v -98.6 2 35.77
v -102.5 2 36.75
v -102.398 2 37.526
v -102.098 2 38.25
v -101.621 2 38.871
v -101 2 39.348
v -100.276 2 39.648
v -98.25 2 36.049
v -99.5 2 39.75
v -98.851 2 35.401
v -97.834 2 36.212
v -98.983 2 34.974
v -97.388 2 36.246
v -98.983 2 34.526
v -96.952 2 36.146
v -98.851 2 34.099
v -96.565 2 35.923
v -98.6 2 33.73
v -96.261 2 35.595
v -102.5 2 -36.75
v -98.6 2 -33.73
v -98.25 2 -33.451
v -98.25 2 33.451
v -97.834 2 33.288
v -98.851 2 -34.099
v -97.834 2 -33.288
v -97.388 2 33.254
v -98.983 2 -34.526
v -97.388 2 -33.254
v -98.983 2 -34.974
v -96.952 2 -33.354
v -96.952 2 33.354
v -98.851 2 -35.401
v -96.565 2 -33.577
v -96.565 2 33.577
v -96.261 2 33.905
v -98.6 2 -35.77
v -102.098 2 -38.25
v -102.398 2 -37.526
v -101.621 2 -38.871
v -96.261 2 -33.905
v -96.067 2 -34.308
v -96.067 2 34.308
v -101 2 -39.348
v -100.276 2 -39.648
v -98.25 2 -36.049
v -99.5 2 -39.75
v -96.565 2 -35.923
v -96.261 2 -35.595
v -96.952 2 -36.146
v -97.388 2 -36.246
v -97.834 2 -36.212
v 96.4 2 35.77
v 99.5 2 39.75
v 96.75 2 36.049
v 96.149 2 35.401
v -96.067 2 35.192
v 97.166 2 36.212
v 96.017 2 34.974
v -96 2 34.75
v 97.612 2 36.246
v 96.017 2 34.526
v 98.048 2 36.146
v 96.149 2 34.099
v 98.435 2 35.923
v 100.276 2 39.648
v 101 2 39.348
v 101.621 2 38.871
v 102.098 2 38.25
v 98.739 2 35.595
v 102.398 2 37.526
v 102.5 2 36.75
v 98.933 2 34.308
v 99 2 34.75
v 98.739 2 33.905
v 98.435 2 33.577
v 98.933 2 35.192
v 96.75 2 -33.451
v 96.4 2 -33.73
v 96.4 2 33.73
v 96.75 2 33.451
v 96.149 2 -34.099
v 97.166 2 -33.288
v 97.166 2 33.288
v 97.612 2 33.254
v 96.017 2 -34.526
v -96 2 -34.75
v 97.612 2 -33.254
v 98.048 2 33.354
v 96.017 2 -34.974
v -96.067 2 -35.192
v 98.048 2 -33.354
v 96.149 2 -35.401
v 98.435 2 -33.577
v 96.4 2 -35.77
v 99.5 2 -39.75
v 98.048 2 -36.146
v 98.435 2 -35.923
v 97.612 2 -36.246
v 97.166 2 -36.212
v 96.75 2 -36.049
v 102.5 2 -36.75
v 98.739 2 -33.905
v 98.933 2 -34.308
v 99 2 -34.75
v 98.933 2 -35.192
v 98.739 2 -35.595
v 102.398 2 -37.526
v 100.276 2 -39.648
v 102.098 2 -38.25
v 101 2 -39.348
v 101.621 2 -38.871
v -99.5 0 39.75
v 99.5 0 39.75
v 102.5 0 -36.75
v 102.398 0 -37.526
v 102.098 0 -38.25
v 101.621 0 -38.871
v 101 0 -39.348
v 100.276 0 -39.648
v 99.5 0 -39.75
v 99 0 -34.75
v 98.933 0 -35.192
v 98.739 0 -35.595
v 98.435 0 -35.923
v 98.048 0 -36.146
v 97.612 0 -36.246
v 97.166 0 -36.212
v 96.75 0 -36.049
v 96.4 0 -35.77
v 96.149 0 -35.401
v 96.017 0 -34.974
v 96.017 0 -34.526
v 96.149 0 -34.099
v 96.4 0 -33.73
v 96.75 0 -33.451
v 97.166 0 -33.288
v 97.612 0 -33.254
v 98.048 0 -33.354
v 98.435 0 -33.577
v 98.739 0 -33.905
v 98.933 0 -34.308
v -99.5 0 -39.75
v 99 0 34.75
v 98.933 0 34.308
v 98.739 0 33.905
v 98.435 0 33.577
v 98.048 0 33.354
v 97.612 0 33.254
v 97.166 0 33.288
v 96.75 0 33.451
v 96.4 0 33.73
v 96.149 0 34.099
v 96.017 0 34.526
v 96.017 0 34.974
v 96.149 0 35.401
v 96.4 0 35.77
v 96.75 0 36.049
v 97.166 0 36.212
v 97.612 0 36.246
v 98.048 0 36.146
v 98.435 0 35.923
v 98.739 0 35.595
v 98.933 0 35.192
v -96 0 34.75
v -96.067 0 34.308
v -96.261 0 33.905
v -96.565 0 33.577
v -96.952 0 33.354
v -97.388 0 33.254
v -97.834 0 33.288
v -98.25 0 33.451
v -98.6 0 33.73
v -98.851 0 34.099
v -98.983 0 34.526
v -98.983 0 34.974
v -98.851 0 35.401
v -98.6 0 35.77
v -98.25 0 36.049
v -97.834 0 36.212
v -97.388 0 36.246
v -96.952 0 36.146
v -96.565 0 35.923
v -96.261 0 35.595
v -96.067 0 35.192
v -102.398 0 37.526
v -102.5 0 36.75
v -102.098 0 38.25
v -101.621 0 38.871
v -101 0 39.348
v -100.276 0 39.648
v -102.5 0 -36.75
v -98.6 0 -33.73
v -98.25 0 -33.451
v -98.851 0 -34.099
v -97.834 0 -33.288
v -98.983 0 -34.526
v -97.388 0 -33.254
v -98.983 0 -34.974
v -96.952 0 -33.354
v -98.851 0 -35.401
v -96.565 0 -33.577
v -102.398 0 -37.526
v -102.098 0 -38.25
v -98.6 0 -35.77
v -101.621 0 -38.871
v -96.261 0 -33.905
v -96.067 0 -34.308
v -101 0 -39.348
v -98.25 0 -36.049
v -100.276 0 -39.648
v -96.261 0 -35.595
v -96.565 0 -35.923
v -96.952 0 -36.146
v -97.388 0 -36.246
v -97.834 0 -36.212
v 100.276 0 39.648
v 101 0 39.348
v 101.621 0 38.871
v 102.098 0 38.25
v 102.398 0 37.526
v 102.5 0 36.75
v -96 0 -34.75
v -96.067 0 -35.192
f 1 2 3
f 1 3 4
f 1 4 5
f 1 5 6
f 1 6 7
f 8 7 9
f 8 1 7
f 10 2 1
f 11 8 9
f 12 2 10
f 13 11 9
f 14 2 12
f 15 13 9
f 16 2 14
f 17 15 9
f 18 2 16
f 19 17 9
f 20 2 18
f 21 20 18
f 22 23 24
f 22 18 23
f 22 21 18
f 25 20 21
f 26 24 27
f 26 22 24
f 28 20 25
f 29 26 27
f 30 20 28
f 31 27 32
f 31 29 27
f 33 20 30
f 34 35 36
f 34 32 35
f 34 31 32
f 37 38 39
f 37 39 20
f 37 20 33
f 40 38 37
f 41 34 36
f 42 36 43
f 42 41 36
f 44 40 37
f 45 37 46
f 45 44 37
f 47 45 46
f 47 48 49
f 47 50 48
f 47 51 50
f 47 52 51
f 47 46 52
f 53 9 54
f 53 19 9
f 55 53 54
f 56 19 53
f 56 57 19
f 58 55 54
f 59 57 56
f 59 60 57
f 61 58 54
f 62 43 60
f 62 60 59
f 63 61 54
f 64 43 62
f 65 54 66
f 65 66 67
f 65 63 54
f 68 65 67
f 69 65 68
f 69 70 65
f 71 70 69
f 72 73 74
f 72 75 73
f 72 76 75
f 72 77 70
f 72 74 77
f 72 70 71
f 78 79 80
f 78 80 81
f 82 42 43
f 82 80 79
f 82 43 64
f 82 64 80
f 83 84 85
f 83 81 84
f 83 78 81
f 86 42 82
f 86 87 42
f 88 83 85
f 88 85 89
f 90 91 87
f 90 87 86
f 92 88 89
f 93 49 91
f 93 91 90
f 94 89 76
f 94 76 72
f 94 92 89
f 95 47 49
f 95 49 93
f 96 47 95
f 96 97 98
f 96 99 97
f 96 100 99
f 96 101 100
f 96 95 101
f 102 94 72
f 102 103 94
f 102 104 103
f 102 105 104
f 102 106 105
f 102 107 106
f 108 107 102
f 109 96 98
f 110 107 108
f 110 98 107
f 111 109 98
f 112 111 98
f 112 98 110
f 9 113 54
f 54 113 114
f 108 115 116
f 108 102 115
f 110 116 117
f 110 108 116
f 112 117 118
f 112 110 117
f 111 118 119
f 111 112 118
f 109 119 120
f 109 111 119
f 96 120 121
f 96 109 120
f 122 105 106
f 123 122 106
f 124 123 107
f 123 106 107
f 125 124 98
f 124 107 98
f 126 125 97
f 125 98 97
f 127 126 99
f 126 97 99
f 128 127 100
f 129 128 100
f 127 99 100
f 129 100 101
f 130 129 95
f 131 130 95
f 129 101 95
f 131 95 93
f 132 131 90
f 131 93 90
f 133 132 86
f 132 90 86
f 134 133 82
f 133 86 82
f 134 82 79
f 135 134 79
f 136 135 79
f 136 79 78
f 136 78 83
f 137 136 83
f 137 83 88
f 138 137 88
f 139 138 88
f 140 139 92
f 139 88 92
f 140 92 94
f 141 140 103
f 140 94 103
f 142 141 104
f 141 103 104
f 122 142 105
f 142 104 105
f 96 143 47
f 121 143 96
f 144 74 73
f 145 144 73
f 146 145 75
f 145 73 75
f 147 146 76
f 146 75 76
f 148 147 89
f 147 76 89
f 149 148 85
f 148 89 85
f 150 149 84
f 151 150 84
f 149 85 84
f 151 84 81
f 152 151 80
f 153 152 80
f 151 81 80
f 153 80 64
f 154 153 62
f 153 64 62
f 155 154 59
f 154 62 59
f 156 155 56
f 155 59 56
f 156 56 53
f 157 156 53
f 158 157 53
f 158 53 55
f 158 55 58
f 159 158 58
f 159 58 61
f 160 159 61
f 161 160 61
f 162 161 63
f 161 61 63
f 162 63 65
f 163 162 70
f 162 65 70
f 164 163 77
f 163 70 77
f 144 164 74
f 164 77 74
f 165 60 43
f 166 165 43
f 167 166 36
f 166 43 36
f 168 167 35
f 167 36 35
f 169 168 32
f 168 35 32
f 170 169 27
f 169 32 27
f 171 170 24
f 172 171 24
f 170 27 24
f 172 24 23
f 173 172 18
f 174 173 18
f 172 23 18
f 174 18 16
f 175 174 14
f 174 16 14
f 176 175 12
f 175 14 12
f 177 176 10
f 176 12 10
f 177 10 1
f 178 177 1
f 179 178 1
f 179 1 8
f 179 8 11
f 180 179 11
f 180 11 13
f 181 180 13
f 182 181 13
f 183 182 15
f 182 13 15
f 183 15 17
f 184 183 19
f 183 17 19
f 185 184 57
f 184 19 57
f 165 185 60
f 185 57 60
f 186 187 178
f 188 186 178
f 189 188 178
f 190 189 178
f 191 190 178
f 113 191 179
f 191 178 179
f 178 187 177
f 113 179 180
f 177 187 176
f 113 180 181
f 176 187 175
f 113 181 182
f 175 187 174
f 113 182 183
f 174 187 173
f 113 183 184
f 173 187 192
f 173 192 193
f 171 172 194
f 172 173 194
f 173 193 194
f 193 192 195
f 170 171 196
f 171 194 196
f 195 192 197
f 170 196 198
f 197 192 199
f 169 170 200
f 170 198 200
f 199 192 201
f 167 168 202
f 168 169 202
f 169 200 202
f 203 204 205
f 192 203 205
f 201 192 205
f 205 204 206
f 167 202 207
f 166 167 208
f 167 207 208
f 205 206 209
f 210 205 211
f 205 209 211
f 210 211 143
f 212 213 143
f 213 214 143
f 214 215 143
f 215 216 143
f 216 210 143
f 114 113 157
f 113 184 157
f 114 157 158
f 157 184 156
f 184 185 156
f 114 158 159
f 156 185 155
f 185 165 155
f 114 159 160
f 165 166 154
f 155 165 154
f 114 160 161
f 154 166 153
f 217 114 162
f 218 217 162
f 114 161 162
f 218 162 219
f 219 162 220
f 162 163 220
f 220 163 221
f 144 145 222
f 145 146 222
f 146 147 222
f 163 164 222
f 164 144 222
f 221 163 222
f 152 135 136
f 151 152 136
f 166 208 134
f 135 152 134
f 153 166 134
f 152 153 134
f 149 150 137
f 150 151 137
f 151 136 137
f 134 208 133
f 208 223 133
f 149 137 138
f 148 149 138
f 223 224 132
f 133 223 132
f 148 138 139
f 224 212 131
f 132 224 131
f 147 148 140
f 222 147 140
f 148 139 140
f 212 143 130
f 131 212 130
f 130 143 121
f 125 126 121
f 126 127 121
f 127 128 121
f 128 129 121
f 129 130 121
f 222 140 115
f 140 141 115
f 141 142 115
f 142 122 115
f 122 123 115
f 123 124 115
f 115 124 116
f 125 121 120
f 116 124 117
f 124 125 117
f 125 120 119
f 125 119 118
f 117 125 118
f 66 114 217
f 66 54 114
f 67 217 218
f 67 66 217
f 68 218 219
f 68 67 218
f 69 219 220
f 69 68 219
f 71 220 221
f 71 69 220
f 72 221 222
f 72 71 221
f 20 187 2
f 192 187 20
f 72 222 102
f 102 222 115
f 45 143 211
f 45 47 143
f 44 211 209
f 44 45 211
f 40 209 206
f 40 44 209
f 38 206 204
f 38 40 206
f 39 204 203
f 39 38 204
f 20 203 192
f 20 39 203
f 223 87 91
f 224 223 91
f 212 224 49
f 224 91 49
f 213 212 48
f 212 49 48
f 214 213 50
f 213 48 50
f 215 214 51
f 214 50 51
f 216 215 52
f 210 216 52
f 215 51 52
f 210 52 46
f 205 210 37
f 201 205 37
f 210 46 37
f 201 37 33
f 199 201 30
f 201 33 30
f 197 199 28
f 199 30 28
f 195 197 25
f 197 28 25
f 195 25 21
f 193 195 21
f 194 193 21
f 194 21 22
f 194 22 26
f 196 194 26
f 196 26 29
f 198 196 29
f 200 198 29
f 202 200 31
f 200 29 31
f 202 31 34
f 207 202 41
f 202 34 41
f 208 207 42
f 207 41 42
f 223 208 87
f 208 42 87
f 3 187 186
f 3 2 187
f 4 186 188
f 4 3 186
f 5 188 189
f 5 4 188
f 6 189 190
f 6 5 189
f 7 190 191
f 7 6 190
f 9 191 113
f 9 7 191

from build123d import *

# Parameters (mm, degrees)
SKETCH1_W           = 205
SKETCH1_H           = 79.5
BOSS_EXTRUDE1_DEPTH = 2
SKETCH2_R           = 1.5
CUT_EXTRUDE1_DEPTH  = 2
FILLET1_R           = 3
FILLET3_R           = 3
FILLET4_R           = 3
FILLET5_R           = 3


with BuildPart() as part:
    # Sketch1 → Boss-Extrude1 (new body)
    with BuildSketch(Plane(origin=(0, 0, 0), x_dir=(1, 0, 0), z_dir=(0, 1, 0))):
        Rectangle(SKETCH1_W, SKETCH1_H)
    extrude(amount=BOSS_EXTRUDE1_DEPTH)

    # Sketch2 → Cut-Extrude1 (cut)
    with BuildSketch(Plane(origin=(0, 2, 0), x_dir=(1, 0, 0), z_dir=(0, 1, 0))):
        with Locations((-97.5, 34.75)):
            Circle(SKETCH2_R)
        with Locations((-97.5, -34.75)):
            Circle(SKETCH2_R)
        with Locations((97.5, -34.75)):
            Circle(SKETCH2_R)
        with Locations((97.5, 34.75)):
            Circle(SKETCH2_R)
    extrude(amount=-CUT_EXTRUDE1_DEPTH, mode=Mode.SUBTRACT)

    # Fillet1
    fillet1_edges = [part.edges().sort_by_distance(p)[0] for p in [
        (-102.5, 1, 39.75),
    ]]
    fillet(fillet1_edges, radius=FILLET1_R)

    # Fillet3
    fillet3_edges = [part.edges().sort_by_distance(p)[0] for p in [
        (102.5, 1, 39.75),
    ]]
    fillet(fillet3_edges, radius=FILLET3_R)

    # Fillet4
    fillet4_edges = [part.edges().sort_by_distance(p)[0] for p in [
        (102.5, 1, -39.75),
    ]]
    fillet(fillet4_edges, radius=FILLET4_R)

    # Fillet5
    fillet5_edges = [part.edges().sort_by_distance(p)[0] for p in [
        (-102.5, 1, -39.75),
    ]]
    fillet(fillet5_edges, radius=FILLET5_R)


solid = part.part
